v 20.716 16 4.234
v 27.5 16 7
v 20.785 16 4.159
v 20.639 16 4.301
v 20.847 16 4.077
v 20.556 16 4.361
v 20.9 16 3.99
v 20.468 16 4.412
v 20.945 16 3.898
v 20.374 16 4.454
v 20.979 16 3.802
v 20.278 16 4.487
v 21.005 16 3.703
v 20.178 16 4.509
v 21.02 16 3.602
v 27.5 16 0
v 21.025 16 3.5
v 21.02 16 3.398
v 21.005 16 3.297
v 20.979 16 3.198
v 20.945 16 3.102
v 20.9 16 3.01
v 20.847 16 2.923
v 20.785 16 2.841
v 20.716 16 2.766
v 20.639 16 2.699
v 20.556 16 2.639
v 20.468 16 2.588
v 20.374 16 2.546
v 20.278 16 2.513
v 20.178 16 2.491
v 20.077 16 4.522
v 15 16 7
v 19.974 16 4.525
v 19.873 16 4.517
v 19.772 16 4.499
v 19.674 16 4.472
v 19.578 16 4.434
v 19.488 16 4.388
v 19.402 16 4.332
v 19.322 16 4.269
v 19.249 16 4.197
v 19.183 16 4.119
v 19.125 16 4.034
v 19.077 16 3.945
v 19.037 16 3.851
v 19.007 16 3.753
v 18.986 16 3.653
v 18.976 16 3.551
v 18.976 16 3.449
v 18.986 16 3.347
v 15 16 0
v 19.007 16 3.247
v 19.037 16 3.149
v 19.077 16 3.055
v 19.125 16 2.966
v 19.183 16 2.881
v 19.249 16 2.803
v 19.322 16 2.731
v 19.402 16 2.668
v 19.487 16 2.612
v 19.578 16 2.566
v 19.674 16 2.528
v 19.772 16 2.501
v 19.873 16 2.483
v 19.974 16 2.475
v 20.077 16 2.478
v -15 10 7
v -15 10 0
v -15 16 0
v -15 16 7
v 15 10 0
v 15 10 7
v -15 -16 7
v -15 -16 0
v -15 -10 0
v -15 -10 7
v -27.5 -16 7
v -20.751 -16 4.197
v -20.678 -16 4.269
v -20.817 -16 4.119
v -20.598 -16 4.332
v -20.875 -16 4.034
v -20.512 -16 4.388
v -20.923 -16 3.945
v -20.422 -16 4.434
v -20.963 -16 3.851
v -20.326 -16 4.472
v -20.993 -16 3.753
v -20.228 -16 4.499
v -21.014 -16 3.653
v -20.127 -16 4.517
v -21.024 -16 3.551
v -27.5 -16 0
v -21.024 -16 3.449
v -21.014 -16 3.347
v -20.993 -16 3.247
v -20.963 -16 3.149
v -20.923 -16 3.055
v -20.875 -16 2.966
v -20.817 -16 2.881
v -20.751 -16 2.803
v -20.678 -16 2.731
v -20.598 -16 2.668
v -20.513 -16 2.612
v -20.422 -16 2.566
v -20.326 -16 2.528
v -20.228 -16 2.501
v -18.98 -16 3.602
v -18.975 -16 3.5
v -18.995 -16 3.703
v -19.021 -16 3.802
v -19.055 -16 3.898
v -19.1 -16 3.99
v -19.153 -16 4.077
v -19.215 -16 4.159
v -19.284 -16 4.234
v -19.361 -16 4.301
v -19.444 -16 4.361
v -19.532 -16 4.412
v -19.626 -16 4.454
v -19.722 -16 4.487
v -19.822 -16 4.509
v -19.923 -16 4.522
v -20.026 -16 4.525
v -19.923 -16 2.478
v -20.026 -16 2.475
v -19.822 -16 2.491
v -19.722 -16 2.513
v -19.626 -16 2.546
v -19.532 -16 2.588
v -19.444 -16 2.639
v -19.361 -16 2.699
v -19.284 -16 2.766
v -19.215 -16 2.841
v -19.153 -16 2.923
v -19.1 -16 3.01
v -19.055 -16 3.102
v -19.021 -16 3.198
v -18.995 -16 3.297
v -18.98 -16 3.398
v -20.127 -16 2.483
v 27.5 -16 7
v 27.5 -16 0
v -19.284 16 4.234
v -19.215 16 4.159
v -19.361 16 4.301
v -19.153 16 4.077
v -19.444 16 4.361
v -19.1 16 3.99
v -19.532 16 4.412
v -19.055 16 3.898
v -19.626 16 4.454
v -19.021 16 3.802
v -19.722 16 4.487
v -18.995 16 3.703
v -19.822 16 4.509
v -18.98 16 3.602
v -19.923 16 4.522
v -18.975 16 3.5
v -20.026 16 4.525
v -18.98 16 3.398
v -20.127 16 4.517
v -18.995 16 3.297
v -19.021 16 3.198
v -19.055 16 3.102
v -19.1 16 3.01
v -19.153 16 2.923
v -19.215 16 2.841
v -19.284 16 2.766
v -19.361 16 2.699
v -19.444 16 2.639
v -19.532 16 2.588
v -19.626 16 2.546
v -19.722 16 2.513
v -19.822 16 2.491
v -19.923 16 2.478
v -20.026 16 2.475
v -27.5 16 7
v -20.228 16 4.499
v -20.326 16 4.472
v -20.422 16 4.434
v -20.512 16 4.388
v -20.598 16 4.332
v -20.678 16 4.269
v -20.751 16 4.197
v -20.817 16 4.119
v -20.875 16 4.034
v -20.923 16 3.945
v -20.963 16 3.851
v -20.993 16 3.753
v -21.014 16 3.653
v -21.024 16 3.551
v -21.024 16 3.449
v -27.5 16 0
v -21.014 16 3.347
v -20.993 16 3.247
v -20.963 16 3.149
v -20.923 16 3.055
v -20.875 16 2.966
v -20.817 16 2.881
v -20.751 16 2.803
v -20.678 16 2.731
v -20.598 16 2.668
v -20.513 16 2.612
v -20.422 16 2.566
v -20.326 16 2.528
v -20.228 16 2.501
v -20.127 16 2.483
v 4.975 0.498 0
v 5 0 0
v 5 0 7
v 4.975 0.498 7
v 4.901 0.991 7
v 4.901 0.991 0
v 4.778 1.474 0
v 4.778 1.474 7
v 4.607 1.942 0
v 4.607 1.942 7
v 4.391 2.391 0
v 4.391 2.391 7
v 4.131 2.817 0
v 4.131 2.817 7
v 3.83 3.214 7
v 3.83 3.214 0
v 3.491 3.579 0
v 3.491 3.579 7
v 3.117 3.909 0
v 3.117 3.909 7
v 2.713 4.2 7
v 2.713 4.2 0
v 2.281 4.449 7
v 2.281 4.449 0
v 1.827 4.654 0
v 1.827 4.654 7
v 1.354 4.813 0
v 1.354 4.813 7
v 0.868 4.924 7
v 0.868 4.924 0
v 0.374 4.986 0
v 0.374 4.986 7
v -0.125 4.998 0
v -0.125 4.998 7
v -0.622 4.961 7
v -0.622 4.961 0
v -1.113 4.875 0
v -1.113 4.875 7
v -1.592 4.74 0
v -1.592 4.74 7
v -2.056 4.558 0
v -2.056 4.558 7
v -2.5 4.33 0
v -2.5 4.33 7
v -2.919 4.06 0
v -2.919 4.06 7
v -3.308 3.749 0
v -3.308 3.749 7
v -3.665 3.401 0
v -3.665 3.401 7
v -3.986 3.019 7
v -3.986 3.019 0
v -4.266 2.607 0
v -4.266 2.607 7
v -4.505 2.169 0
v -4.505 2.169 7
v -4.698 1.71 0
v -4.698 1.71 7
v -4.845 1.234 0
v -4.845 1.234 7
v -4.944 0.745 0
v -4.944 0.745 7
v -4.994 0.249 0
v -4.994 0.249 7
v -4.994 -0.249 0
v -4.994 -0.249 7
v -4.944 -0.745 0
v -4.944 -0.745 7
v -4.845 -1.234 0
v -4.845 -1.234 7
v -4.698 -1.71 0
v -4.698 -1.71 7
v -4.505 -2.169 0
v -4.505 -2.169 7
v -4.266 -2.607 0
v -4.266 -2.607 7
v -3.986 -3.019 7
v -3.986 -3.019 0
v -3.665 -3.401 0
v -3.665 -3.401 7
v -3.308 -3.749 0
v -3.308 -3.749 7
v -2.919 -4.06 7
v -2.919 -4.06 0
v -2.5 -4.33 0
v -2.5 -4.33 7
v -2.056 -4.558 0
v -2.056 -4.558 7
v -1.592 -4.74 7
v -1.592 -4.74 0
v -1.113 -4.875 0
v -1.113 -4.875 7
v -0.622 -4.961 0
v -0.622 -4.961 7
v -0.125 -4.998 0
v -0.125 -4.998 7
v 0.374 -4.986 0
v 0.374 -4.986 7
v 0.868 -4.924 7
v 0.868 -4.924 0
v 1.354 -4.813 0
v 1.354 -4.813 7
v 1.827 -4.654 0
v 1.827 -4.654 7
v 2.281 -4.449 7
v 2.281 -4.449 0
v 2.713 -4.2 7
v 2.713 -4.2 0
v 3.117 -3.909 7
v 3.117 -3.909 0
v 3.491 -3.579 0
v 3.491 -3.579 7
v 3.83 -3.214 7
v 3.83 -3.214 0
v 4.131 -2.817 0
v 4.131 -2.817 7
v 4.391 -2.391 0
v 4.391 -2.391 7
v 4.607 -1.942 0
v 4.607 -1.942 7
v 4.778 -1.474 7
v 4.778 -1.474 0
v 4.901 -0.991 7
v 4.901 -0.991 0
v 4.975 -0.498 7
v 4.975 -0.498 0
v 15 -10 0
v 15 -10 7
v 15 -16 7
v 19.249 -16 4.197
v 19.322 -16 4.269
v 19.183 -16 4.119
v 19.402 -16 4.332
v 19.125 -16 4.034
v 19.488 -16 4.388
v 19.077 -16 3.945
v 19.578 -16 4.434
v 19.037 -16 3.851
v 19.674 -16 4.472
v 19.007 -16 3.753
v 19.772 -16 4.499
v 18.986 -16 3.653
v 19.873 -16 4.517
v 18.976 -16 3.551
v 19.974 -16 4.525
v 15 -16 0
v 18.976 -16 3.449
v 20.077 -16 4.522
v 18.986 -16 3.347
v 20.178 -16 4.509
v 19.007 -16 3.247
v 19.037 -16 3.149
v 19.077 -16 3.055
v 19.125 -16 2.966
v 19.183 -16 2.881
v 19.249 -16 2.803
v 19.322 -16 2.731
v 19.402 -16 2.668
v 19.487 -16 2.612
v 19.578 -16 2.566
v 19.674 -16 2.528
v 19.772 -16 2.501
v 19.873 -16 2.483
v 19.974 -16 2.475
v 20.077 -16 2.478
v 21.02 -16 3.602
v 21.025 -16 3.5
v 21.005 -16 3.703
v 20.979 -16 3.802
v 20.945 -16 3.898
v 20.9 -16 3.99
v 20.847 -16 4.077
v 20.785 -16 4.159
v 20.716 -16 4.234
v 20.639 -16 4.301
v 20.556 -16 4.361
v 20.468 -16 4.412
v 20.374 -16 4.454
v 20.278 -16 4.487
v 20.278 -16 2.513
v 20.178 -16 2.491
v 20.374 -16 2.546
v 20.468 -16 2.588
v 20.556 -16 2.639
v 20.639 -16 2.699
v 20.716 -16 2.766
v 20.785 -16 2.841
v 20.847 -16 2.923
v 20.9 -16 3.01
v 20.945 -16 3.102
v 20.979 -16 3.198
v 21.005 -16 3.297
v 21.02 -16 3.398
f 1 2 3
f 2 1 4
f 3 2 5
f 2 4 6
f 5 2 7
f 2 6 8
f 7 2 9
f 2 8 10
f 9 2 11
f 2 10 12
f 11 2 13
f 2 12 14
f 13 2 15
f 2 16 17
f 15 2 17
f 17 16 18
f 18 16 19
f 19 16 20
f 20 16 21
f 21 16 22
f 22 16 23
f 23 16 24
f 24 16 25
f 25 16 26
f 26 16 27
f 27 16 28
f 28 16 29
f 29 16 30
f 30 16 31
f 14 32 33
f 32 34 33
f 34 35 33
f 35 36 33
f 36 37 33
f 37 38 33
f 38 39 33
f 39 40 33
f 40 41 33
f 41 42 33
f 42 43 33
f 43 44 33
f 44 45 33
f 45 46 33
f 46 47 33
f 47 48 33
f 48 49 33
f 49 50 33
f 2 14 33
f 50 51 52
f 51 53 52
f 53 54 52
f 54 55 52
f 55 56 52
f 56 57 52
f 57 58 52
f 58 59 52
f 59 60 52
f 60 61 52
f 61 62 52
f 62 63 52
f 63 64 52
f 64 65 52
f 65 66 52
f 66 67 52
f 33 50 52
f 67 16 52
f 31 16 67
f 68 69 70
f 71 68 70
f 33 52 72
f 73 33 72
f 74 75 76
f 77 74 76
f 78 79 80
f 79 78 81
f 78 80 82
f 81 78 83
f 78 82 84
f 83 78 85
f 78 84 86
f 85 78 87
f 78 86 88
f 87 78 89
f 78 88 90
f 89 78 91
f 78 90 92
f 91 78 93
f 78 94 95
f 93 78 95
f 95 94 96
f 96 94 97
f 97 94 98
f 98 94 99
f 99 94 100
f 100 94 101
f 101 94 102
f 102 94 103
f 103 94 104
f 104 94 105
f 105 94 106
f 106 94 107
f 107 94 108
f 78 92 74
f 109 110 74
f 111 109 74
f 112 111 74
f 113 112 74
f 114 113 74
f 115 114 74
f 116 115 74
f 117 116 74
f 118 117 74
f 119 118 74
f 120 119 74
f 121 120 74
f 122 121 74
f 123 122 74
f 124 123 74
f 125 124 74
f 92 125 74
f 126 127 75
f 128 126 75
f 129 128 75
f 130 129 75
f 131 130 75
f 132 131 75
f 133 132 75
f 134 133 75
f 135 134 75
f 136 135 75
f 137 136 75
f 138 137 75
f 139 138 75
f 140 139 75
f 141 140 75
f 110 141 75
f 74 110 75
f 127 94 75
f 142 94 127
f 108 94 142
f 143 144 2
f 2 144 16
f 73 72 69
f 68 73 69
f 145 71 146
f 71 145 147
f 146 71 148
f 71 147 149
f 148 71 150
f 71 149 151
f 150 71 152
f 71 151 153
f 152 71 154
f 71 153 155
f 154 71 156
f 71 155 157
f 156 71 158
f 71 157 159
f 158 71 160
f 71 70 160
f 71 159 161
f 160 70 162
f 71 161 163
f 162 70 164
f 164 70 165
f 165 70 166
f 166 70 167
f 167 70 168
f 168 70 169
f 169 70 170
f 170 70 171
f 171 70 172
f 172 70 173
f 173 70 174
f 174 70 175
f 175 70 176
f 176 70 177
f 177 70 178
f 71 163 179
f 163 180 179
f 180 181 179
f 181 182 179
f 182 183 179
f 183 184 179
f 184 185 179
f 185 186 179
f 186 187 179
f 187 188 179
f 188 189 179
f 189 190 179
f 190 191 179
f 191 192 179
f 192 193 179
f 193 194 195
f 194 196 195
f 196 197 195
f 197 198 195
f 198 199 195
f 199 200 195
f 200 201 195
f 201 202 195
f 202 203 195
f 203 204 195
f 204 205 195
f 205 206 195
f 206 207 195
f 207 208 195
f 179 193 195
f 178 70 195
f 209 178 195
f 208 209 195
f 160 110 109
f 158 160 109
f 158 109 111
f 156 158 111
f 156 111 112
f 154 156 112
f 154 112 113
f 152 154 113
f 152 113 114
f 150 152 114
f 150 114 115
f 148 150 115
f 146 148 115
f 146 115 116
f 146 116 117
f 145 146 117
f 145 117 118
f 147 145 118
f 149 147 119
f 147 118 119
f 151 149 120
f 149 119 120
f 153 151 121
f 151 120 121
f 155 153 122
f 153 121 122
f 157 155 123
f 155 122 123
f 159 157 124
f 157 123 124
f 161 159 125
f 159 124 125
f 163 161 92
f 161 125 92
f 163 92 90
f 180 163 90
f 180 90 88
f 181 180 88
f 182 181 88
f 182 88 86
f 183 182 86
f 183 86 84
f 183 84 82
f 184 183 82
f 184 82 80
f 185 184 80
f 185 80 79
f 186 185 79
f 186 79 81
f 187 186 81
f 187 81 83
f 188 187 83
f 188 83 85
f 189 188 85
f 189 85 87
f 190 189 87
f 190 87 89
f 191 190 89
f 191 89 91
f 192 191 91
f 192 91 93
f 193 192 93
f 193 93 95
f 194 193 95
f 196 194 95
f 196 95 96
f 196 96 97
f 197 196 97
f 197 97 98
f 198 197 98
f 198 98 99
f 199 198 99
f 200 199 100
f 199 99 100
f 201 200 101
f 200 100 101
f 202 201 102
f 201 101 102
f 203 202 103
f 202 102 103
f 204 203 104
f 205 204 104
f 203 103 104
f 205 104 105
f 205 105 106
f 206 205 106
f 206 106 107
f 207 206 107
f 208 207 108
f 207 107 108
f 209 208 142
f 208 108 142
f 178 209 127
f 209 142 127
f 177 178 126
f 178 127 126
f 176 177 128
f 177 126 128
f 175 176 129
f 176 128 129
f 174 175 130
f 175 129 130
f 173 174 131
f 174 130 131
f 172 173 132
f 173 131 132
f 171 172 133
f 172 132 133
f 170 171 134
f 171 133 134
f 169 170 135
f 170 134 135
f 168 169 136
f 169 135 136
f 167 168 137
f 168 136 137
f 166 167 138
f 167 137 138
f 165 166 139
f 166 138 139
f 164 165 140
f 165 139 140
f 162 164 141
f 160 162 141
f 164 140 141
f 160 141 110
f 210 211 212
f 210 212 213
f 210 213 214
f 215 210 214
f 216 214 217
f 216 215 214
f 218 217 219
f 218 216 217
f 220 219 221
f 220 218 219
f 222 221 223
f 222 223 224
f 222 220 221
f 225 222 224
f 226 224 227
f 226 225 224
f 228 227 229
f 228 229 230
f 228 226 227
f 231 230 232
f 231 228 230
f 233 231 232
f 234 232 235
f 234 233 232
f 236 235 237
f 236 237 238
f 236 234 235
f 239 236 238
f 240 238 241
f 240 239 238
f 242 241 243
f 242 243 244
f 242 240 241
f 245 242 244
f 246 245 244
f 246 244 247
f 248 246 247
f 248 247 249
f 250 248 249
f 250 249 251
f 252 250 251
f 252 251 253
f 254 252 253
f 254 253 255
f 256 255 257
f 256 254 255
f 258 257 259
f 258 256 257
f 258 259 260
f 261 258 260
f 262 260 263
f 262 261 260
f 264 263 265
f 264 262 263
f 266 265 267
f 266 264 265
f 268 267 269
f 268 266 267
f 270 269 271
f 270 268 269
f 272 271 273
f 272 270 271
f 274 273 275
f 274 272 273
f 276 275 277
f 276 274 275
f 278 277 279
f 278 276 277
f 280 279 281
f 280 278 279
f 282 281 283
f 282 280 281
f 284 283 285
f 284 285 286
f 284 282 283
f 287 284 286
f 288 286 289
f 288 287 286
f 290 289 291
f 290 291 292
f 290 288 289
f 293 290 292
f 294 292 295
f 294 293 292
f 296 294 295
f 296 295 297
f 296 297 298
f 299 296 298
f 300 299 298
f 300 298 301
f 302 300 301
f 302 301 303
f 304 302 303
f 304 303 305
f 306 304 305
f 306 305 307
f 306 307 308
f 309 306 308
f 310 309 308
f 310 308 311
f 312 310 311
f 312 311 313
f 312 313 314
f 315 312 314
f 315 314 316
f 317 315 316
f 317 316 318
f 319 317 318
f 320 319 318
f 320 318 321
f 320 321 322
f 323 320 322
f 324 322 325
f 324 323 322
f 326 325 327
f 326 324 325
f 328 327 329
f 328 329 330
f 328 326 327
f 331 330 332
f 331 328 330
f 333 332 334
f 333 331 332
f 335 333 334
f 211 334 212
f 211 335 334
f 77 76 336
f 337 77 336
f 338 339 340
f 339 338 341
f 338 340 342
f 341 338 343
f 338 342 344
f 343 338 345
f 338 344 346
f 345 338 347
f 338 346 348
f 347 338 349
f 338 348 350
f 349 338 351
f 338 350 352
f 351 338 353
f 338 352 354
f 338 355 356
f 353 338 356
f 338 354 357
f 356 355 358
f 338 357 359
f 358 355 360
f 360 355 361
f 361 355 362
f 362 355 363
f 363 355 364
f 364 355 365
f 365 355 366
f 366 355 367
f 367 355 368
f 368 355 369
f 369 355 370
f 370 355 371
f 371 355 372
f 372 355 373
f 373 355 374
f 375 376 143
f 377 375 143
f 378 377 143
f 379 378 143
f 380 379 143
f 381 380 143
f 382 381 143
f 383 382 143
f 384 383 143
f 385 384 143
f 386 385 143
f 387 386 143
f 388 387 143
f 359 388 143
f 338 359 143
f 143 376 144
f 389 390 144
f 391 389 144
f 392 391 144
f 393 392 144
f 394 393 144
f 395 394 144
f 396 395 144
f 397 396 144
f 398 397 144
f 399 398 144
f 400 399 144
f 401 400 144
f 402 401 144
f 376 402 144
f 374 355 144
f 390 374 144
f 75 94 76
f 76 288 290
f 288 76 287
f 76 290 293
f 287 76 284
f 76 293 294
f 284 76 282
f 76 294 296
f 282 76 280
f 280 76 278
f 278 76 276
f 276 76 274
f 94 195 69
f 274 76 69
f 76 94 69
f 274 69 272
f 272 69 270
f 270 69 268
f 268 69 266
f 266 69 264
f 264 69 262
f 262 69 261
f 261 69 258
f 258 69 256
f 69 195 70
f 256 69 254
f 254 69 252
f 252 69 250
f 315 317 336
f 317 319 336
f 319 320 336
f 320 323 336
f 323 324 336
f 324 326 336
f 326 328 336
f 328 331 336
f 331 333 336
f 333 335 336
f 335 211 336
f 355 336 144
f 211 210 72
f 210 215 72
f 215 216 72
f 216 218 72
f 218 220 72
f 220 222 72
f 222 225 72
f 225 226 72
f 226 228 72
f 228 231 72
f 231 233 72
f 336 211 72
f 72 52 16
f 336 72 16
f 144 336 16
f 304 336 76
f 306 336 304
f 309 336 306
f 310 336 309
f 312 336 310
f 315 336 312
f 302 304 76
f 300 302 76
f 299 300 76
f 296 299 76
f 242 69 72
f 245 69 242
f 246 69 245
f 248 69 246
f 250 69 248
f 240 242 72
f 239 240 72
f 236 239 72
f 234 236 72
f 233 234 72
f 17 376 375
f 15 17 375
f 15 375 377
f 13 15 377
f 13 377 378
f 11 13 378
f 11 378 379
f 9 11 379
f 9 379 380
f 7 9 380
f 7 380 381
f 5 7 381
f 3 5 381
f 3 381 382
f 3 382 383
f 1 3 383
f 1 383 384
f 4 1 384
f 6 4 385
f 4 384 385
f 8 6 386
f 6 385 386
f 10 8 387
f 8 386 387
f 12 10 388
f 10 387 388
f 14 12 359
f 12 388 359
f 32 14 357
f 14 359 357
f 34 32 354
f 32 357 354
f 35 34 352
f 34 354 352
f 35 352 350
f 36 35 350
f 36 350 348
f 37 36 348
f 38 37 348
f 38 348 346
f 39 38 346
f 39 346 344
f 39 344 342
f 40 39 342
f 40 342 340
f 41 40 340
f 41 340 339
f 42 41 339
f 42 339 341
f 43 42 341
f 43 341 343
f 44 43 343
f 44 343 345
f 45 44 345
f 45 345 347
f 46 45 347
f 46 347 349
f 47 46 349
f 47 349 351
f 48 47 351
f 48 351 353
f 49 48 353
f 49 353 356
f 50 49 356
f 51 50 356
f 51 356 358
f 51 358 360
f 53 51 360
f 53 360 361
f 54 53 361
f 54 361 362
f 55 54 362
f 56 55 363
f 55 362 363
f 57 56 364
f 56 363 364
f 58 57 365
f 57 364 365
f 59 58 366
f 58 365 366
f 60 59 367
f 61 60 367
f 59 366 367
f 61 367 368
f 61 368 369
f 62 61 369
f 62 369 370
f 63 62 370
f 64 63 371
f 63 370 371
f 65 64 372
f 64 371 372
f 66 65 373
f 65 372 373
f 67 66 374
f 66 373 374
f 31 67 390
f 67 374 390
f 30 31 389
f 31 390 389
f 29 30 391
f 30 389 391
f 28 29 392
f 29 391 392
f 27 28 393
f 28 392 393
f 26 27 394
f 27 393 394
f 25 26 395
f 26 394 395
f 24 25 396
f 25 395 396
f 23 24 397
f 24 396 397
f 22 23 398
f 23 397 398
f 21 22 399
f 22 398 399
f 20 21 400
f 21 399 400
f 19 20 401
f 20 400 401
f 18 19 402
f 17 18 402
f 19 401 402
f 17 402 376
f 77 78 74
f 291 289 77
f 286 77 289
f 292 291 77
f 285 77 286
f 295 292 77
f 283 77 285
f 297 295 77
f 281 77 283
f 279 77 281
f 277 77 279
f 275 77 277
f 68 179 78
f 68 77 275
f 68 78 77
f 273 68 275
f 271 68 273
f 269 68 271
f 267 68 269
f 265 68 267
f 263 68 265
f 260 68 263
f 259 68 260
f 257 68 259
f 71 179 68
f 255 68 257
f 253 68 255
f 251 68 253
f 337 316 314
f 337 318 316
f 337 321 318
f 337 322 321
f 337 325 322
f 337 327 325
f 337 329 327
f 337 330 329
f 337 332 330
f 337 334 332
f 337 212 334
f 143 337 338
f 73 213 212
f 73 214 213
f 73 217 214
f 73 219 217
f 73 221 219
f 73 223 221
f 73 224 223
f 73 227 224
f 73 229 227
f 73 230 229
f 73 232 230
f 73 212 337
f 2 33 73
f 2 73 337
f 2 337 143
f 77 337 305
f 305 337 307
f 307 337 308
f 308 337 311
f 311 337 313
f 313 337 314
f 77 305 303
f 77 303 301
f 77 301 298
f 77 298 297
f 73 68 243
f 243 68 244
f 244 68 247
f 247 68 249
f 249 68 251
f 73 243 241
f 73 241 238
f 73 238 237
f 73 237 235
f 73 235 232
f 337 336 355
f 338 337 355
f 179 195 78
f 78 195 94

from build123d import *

# Parameters (mm, degrees)
SKETCH1_R                = 5
BOSS_EXTRUDE1_DEPTH      = 7
M2_5X0_45_TAPPED_HOLE1_D = 2.05


with BuildPart() as part:
    # Sketch1 → Boss-Extrude1 (new body)
    with BuildSketch(Plane.XY):
        Polygon((-15, 10), (-15, 16), (-27.5, 16), (-27.5, -16), (-15, -16), (-15, -10), (15, -10), (15, -16), (27.5, -16), (27.5, 16), (15, 16), (15, 10), align=None)
        Circle(SKETCH1_R, mode=Mode.SUBTRACT)
    extrude(amount=BOSS_EXTRUDE1_DEPTH)

    # M2.5x0.45 Tapped Hole1 (through all)
    with Locations(Plane(origin=(0, 16, 0), x_dir=(-1, 0, 0), z_dir=(0, 1, 0))):
        with Locations((20, 3.5), (-20, 3.5)):
            Hole(M2_5X0_45_TAPPED_HOLE1_D / 2)


solid = part.part
